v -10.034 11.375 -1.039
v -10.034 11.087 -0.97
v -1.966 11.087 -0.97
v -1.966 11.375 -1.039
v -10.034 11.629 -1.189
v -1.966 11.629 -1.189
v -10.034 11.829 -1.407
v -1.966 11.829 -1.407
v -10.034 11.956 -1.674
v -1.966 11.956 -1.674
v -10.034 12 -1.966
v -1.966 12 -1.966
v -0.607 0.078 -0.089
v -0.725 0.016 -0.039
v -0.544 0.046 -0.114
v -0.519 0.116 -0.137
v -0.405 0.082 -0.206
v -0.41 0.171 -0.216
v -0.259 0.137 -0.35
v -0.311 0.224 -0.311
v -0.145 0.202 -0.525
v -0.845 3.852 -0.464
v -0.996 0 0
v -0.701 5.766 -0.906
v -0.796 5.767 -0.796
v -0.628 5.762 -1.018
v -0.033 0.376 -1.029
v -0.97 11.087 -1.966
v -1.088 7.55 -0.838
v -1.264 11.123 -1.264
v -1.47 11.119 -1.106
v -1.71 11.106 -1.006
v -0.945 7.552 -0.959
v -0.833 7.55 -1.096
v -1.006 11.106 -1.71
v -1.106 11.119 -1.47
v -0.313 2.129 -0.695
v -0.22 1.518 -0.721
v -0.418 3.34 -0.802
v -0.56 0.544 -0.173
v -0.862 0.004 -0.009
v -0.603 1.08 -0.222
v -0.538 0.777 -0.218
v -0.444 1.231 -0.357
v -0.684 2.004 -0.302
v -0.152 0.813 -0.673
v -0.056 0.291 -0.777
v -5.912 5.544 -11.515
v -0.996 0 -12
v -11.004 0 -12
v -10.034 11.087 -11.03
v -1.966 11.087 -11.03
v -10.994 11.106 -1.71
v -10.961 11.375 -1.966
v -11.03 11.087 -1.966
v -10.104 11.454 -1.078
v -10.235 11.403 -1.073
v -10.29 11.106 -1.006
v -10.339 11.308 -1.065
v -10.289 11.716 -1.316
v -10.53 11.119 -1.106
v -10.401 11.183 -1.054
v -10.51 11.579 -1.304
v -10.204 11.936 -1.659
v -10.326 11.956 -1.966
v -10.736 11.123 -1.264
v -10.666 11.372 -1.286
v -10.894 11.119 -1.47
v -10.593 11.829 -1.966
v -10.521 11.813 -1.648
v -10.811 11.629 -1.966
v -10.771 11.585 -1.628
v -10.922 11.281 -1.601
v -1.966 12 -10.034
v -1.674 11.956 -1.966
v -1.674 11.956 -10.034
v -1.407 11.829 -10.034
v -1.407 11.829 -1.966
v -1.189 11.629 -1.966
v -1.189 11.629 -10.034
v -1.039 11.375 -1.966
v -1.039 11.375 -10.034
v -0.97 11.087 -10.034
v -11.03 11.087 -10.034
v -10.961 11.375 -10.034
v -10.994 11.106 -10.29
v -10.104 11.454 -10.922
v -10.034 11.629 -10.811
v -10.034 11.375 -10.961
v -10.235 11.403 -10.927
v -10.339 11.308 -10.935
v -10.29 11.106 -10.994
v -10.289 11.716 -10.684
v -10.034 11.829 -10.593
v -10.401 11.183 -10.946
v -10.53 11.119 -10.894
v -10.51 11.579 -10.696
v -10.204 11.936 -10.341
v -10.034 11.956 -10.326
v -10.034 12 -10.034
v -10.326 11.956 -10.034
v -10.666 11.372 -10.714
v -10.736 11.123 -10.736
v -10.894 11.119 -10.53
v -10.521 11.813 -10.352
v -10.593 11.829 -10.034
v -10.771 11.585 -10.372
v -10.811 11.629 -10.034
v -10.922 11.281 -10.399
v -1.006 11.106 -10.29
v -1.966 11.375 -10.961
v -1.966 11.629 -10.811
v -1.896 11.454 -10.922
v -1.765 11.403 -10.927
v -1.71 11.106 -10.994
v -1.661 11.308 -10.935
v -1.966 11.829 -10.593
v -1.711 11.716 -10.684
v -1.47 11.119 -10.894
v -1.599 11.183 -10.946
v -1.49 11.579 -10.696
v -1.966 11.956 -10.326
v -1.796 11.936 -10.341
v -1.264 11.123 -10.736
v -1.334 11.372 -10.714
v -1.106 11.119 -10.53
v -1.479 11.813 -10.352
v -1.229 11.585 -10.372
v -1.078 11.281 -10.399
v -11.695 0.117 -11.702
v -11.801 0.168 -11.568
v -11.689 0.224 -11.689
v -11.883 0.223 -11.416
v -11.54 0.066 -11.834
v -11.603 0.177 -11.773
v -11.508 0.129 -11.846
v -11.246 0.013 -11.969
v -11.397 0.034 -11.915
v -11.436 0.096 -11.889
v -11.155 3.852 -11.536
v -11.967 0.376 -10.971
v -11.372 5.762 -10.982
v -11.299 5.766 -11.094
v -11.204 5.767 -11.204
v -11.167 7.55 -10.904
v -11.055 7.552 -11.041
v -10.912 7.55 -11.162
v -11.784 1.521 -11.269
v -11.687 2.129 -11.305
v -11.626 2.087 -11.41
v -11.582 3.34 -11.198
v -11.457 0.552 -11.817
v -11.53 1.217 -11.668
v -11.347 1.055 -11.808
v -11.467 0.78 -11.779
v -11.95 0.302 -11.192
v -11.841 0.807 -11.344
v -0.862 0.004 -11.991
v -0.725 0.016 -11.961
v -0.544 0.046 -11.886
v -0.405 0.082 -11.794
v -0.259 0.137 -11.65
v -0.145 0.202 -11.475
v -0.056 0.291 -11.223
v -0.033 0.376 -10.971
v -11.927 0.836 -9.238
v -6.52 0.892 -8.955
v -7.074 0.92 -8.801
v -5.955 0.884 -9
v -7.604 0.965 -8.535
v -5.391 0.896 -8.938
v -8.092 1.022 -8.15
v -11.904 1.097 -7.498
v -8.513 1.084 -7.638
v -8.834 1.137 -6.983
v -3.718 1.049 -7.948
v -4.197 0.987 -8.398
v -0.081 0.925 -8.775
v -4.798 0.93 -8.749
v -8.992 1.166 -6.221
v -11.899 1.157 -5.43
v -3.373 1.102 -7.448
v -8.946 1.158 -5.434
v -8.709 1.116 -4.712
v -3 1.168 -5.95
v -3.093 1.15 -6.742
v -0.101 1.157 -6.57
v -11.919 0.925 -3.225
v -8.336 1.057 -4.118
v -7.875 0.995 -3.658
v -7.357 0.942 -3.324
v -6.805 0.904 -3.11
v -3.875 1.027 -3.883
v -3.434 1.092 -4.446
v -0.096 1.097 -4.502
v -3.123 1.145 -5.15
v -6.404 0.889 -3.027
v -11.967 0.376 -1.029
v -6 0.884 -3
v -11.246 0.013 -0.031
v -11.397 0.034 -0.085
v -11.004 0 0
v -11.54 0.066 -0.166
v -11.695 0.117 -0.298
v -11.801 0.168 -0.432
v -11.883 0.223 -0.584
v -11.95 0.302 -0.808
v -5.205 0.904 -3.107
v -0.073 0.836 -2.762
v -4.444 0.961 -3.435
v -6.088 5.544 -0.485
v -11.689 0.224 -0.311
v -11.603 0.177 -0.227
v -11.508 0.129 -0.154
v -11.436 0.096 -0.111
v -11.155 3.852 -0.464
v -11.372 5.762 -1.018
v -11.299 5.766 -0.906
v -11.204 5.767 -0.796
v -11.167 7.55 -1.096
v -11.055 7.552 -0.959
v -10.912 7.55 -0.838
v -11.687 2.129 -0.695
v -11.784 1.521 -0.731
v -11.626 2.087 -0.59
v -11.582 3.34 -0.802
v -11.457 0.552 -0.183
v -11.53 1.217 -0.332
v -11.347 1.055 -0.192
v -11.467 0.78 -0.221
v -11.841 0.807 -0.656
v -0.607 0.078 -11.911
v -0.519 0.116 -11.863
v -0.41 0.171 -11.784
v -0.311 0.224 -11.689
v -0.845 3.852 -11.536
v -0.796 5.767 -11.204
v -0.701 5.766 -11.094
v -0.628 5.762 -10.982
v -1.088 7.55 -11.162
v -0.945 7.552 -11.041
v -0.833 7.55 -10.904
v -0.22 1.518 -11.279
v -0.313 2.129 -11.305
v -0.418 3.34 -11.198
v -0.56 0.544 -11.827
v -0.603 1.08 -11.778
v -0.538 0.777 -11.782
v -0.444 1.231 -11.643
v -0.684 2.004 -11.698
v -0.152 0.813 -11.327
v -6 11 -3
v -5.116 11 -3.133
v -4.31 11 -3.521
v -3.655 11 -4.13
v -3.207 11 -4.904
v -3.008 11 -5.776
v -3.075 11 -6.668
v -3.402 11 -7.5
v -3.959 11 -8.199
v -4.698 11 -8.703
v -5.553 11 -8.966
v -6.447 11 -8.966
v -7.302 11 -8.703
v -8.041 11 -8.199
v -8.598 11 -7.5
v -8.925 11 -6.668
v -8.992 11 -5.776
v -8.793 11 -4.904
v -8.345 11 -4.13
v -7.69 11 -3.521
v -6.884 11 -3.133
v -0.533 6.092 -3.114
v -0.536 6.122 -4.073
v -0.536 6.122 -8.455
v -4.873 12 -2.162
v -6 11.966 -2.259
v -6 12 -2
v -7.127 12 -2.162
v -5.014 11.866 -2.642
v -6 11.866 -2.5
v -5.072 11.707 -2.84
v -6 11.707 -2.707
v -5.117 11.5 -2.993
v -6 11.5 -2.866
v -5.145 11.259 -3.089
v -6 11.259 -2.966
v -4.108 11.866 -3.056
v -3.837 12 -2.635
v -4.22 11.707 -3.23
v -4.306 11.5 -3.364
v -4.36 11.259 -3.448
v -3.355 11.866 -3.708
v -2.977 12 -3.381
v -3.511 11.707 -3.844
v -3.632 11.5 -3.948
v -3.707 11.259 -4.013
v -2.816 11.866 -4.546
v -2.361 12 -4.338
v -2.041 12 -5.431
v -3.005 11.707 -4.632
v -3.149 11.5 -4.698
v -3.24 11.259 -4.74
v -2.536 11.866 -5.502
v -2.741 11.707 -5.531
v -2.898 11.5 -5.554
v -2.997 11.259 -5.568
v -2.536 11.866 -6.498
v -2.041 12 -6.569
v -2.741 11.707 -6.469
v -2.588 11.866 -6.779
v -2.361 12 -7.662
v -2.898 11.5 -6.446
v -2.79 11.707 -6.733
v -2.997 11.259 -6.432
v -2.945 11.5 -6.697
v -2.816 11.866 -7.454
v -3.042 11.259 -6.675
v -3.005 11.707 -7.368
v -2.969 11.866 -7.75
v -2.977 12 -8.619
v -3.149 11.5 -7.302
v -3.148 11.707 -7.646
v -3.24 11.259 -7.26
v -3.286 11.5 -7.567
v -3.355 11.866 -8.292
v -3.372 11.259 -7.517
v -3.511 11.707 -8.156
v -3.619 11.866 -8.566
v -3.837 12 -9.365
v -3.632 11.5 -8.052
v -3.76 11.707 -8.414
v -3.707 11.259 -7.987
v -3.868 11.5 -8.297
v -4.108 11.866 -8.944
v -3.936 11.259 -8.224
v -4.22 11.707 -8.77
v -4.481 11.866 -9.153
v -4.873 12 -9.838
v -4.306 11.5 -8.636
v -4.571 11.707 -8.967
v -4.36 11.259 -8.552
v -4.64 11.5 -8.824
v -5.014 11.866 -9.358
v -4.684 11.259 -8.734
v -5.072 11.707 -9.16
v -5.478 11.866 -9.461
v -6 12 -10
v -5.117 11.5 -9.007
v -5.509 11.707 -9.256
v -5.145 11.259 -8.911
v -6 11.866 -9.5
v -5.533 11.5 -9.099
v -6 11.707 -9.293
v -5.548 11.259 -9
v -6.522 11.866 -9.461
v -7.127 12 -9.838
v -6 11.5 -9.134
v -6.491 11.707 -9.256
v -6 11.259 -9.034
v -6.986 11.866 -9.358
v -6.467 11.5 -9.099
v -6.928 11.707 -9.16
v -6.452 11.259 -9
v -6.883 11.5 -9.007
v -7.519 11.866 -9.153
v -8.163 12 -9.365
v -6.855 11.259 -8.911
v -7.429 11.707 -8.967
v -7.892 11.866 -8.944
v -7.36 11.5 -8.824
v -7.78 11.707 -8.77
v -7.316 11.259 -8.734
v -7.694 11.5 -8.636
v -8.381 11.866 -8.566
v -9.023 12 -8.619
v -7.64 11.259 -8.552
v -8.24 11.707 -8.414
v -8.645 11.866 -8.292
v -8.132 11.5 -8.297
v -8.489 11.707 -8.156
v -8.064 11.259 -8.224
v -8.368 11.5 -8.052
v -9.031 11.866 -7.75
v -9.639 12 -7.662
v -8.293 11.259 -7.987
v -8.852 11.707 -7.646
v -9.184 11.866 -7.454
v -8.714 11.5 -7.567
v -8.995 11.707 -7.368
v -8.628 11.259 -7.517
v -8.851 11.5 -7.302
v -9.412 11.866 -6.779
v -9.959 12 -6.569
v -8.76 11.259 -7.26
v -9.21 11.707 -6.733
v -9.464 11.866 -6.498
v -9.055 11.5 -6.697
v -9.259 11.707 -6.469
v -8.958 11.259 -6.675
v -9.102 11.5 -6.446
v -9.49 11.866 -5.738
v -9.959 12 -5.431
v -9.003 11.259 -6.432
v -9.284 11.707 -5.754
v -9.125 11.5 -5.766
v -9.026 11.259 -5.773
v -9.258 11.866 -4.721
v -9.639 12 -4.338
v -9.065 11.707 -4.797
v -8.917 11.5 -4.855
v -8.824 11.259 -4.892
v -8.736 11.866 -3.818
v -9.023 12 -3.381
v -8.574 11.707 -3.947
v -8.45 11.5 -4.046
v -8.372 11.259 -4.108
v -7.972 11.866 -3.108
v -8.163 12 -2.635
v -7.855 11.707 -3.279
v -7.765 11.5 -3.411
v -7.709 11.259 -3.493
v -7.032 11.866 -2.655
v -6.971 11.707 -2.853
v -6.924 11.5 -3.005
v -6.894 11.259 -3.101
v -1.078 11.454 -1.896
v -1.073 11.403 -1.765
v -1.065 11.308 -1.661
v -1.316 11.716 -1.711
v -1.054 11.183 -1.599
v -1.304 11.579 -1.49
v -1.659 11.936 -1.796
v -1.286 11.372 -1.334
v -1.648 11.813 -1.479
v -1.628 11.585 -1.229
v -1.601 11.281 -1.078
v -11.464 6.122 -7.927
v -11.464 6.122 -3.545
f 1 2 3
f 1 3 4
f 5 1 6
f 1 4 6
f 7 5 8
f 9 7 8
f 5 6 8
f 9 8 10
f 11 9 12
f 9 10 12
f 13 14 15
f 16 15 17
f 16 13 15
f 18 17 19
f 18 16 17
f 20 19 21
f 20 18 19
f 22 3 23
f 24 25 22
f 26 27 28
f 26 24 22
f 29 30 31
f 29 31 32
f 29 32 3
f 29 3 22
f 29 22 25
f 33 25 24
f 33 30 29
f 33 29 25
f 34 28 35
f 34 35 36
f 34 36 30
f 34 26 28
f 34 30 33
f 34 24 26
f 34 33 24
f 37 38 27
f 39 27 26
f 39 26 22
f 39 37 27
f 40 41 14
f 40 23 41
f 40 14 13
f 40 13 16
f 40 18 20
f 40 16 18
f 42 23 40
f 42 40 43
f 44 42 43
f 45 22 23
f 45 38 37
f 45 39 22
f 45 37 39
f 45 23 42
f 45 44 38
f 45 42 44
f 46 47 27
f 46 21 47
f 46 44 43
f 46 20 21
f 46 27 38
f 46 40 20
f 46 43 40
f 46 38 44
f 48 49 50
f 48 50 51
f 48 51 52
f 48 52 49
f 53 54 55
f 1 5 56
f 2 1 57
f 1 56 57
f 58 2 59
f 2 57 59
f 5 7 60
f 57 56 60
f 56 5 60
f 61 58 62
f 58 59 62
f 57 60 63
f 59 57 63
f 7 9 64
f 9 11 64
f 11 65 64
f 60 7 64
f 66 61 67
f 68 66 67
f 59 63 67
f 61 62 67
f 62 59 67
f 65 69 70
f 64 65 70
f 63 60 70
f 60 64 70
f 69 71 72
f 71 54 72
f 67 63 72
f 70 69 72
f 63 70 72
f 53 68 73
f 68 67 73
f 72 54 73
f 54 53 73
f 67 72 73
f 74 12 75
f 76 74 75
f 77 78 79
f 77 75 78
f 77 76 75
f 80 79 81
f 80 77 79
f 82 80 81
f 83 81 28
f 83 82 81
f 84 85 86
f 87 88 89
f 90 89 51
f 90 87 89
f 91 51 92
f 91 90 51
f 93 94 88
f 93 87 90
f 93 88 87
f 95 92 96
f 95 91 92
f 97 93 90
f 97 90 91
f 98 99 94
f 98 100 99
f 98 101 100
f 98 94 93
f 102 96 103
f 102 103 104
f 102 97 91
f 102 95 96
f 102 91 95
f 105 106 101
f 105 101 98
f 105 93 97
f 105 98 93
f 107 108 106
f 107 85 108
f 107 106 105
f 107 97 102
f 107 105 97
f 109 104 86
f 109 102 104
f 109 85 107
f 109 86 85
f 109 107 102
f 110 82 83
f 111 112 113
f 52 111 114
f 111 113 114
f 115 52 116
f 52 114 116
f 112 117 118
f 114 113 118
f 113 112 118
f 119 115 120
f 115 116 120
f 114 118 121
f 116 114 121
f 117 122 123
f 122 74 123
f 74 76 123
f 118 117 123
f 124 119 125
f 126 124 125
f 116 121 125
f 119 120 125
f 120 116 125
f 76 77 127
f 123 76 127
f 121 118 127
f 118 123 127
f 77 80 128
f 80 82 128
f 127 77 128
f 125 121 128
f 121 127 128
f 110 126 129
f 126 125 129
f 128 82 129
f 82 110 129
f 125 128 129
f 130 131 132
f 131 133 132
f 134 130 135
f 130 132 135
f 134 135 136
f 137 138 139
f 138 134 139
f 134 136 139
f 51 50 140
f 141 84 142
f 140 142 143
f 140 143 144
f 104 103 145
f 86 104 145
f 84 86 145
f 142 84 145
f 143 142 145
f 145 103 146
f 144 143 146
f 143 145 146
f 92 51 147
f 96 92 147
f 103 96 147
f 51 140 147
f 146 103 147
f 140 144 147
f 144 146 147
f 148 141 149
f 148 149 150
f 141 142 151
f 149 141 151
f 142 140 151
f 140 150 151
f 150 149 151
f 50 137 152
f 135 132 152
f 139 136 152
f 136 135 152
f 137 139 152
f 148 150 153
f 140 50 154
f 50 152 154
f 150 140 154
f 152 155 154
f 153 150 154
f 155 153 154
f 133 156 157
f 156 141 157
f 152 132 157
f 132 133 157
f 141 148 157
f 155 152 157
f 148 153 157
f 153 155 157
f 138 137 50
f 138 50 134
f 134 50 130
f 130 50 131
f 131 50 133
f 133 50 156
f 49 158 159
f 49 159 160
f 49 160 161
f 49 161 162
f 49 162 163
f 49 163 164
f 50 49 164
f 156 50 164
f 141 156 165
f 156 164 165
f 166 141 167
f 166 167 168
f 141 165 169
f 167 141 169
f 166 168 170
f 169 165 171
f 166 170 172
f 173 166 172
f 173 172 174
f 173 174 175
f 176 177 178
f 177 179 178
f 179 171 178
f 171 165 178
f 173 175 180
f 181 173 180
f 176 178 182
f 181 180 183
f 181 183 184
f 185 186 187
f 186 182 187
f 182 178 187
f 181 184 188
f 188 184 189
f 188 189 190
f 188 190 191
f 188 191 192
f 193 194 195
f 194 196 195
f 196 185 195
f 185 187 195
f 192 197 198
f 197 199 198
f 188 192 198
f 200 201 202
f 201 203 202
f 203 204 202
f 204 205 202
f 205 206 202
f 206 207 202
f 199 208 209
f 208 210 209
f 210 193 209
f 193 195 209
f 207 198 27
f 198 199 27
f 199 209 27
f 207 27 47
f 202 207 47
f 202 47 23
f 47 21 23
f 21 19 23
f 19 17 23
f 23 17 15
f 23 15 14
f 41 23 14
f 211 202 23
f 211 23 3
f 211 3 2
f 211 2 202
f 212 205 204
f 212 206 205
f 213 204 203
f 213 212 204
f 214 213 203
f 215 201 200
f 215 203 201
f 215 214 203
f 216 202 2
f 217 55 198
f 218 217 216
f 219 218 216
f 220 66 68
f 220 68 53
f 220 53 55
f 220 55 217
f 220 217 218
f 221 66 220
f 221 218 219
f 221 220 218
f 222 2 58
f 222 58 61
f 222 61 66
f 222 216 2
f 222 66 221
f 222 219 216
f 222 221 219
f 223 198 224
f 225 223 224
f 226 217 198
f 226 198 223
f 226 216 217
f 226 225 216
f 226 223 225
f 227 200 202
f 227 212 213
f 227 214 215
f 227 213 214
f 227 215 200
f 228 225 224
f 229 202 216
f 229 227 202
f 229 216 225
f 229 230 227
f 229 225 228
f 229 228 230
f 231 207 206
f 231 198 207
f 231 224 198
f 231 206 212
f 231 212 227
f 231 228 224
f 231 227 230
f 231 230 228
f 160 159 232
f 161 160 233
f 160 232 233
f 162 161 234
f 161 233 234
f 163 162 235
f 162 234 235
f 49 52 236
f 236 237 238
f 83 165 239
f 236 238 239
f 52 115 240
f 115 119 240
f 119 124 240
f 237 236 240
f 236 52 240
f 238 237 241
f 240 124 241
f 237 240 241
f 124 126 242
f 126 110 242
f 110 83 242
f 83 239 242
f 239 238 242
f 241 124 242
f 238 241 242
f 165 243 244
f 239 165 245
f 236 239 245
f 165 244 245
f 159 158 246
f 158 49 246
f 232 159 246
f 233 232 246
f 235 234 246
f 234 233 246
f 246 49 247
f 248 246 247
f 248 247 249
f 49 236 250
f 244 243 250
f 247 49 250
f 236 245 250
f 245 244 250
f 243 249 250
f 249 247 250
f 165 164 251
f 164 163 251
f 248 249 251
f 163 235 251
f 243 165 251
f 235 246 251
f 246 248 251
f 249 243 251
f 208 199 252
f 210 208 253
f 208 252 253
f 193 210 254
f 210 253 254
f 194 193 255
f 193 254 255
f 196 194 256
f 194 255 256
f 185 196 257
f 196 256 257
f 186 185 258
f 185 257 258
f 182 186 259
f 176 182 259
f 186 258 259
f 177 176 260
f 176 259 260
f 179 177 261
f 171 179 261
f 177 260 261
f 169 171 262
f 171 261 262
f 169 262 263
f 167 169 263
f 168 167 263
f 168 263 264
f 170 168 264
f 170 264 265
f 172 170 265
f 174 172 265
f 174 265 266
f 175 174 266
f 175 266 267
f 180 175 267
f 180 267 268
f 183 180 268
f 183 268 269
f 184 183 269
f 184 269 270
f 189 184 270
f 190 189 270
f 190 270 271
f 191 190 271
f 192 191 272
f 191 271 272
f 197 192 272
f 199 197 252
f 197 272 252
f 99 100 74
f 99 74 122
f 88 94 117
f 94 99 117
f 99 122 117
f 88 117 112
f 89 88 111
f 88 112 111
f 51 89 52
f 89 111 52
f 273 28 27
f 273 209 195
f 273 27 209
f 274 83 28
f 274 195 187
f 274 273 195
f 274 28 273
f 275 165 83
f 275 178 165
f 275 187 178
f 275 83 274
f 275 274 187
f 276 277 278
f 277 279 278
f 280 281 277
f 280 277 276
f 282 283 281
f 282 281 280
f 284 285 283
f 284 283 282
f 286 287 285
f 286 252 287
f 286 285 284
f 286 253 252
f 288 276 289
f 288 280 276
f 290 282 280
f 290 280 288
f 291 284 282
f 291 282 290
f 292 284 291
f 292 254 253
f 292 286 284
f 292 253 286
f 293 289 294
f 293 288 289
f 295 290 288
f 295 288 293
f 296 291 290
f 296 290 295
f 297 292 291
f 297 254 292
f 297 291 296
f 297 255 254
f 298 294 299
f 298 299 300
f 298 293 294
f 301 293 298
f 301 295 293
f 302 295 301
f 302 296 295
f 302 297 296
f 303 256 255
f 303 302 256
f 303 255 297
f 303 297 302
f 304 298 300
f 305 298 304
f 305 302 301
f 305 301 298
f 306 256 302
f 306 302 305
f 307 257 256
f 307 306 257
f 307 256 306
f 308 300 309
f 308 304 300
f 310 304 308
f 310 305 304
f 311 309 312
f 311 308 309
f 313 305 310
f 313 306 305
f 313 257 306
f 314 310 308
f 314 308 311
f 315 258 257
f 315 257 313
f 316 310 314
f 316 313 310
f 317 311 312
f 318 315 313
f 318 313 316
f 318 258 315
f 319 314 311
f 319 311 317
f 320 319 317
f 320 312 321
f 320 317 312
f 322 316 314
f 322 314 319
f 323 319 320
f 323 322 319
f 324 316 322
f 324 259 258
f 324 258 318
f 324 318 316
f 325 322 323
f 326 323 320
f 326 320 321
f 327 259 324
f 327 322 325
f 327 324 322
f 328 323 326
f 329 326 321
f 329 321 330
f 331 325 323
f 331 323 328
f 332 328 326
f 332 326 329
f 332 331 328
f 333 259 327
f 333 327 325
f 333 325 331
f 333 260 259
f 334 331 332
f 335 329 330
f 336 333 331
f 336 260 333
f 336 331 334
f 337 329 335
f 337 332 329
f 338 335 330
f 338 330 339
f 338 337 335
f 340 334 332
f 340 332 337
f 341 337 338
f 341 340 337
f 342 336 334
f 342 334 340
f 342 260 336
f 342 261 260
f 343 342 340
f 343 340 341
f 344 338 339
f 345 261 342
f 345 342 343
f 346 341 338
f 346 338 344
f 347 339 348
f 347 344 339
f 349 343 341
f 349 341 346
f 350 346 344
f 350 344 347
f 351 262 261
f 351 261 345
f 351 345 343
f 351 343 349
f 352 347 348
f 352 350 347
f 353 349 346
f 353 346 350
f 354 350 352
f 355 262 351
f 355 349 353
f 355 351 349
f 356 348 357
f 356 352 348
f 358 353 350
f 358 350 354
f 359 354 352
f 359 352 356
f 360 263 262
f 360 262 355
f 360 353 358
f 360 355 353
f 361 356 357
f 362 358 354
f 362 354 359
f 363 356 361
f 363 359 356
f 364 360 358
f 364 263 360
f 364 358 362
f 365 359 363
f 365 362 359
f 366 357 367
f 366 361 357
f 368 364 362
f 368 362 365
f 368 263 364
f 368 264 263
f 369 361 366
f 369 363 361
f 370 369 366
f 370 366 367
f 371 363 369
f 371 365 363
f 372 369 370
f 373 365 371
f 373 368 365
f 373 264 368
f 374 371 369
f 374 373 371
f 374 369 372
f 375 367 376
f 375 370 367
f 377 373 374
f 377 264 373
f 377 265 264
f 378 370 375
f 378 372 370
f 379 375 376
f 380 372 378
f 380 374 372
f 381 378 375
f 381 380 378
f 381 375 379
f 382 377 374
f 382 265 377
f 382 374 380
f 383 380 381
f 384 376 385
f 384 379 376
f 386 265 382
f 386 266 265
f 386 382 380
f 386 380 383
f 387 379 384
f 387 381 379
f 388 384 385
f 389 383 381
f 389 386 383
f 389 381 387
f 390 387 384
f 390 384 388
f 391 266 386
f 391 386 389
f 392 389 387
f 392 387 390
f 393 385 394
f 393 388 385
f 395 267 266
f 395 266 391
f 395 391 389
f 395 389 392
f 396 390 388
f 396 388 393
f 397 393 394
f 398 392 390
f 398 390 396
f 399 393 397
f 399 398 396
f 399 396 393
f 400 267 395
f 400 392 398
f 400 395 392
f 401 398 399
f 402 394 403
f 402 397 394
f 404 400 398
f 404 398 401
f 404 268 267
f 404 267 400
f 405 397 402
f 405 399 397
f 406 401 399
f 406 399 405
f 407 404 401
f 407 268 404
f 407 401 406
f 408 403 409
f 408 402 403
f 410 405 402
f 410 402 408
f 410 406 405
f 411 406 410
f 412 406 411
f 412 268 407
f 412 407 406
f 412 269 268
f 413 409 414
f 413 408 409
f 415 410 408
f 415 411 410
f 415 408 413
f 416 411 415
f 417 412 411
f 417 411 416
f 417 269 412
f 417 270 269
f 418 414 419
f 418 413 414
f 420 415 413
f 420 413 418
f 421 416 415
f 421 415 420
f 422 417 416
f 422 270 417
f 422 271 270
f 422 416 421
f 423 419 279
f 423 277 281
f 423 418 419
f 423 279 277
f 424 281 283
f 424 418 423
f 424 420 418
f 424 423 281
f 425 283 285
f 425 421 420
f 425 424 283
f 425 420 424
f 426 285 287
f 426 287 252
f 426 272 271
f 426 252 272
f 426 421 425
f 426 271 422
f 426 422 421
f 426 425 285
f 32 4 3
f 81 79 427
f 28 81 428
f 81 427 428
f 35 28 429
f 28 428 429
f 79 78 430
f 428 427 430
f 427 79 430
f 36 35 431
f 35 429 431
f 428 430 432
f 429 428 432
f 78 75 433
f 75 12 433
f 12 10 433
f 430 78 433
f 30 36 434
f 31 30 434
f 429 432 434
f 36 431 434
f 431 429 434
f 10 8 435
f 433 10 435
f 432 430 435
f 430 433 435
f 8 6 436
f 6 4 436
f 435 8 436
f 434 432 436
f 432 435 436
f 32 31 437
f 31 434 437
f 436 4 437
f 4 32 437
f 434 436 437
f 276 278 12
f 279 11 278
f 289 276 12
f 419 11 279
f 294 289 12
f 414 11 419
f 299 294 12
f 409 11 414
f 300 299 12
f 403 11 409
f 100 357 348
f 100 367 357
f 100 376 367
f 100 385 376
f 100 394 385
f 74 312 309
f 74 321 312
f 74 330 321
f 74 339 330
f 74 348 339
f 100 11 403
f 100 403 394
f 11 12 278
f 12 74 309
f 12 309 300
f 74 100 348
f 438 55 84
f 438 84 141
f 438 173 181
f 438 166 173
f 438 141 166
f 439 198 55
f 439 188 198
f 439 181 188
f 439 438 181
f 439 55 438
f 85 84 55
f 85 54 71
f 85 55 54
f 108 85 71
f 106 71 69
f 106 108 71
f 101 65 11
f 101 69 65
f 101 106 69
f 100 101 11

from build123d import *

# Parameters (mm, degrees)
SKETCH1_W           = 12
SKETCH1_H           = 12
BOSS_EXTRUDE1_DEPTH = 12
BOSS_EXTRUDE1_TAPER = 5
SKETCH2_R           = 3
CUT_EXTRUDE1_DEPTH  = 21.784609864
FILLET1_R           = 1
SKETCH3_R           = 16
CUT_EXTRUDE2_DEPTH  = 21.784609864


with BuildPart() as part:
    # Sketch1 → Boss-Extrude1 (new body)
    with BuildSketch(Plane(origin=(0, 0, 0), x_dir=(1, 0, 0), z_dir=(0, 1, 0))):
        with Locations((-6, 6)):
            Rectangle(SKETCH1_W, SKETCH1_H)
    extrude(amount=BOSS_EXTRUDE1_DEPTH, taper=BOSS_EXTRUDE1_TAPER)

    # Sketch2 → Cut-Extrude1 (cut, through all)
    with BuildSketch(Plane(origin=(0, 12, 0), x_dir=(1, 0, 0), z_dir=(0, 1, 0))):
        with Locations(Location((-6, 6, 0), (0, 0, 270))):
            Circle(SKETCH2_R)
    extrude(amount=-CUT_EXTRUDE1_DEPTH, mode=Mode.SUBTRACT)

    # Fillet1
    fillet1_edges = [part.edges().sort_by_distance(p)[0] for p in [
        (-10.950136038, 12, -6),
        (-6, 12, -1.049863962),
        (-6, 12, -9),
        (-1.049863962, 12, -6),
        (-6, 12, -10.950136038),
        (-0.524931981, 6, -0.524931981),
        (-11.475068019, 6, -0.524931981),
        (-11.475068019, 6, -11.475068019),
        (-0.524931981, 6, -11.475068019),
    ]]
    fillet(fillet1_edges, radius=FILLET1_R)

    # Sketch3 → Cut-Extrude2 (cut, through all)
    with BuildSketch(Plane(origin=(0, 0, 0), x_dir=(0, 0, -1), z_dir=(1, 0, 0))):
        with Locations((6, -14.832396974)):
            Circle(SKETCH3_R)
    extrude(amount=-CUT_EXTRUDE2_DEPTH, mode=Mode.SUBTRACT)


solid = part.part
